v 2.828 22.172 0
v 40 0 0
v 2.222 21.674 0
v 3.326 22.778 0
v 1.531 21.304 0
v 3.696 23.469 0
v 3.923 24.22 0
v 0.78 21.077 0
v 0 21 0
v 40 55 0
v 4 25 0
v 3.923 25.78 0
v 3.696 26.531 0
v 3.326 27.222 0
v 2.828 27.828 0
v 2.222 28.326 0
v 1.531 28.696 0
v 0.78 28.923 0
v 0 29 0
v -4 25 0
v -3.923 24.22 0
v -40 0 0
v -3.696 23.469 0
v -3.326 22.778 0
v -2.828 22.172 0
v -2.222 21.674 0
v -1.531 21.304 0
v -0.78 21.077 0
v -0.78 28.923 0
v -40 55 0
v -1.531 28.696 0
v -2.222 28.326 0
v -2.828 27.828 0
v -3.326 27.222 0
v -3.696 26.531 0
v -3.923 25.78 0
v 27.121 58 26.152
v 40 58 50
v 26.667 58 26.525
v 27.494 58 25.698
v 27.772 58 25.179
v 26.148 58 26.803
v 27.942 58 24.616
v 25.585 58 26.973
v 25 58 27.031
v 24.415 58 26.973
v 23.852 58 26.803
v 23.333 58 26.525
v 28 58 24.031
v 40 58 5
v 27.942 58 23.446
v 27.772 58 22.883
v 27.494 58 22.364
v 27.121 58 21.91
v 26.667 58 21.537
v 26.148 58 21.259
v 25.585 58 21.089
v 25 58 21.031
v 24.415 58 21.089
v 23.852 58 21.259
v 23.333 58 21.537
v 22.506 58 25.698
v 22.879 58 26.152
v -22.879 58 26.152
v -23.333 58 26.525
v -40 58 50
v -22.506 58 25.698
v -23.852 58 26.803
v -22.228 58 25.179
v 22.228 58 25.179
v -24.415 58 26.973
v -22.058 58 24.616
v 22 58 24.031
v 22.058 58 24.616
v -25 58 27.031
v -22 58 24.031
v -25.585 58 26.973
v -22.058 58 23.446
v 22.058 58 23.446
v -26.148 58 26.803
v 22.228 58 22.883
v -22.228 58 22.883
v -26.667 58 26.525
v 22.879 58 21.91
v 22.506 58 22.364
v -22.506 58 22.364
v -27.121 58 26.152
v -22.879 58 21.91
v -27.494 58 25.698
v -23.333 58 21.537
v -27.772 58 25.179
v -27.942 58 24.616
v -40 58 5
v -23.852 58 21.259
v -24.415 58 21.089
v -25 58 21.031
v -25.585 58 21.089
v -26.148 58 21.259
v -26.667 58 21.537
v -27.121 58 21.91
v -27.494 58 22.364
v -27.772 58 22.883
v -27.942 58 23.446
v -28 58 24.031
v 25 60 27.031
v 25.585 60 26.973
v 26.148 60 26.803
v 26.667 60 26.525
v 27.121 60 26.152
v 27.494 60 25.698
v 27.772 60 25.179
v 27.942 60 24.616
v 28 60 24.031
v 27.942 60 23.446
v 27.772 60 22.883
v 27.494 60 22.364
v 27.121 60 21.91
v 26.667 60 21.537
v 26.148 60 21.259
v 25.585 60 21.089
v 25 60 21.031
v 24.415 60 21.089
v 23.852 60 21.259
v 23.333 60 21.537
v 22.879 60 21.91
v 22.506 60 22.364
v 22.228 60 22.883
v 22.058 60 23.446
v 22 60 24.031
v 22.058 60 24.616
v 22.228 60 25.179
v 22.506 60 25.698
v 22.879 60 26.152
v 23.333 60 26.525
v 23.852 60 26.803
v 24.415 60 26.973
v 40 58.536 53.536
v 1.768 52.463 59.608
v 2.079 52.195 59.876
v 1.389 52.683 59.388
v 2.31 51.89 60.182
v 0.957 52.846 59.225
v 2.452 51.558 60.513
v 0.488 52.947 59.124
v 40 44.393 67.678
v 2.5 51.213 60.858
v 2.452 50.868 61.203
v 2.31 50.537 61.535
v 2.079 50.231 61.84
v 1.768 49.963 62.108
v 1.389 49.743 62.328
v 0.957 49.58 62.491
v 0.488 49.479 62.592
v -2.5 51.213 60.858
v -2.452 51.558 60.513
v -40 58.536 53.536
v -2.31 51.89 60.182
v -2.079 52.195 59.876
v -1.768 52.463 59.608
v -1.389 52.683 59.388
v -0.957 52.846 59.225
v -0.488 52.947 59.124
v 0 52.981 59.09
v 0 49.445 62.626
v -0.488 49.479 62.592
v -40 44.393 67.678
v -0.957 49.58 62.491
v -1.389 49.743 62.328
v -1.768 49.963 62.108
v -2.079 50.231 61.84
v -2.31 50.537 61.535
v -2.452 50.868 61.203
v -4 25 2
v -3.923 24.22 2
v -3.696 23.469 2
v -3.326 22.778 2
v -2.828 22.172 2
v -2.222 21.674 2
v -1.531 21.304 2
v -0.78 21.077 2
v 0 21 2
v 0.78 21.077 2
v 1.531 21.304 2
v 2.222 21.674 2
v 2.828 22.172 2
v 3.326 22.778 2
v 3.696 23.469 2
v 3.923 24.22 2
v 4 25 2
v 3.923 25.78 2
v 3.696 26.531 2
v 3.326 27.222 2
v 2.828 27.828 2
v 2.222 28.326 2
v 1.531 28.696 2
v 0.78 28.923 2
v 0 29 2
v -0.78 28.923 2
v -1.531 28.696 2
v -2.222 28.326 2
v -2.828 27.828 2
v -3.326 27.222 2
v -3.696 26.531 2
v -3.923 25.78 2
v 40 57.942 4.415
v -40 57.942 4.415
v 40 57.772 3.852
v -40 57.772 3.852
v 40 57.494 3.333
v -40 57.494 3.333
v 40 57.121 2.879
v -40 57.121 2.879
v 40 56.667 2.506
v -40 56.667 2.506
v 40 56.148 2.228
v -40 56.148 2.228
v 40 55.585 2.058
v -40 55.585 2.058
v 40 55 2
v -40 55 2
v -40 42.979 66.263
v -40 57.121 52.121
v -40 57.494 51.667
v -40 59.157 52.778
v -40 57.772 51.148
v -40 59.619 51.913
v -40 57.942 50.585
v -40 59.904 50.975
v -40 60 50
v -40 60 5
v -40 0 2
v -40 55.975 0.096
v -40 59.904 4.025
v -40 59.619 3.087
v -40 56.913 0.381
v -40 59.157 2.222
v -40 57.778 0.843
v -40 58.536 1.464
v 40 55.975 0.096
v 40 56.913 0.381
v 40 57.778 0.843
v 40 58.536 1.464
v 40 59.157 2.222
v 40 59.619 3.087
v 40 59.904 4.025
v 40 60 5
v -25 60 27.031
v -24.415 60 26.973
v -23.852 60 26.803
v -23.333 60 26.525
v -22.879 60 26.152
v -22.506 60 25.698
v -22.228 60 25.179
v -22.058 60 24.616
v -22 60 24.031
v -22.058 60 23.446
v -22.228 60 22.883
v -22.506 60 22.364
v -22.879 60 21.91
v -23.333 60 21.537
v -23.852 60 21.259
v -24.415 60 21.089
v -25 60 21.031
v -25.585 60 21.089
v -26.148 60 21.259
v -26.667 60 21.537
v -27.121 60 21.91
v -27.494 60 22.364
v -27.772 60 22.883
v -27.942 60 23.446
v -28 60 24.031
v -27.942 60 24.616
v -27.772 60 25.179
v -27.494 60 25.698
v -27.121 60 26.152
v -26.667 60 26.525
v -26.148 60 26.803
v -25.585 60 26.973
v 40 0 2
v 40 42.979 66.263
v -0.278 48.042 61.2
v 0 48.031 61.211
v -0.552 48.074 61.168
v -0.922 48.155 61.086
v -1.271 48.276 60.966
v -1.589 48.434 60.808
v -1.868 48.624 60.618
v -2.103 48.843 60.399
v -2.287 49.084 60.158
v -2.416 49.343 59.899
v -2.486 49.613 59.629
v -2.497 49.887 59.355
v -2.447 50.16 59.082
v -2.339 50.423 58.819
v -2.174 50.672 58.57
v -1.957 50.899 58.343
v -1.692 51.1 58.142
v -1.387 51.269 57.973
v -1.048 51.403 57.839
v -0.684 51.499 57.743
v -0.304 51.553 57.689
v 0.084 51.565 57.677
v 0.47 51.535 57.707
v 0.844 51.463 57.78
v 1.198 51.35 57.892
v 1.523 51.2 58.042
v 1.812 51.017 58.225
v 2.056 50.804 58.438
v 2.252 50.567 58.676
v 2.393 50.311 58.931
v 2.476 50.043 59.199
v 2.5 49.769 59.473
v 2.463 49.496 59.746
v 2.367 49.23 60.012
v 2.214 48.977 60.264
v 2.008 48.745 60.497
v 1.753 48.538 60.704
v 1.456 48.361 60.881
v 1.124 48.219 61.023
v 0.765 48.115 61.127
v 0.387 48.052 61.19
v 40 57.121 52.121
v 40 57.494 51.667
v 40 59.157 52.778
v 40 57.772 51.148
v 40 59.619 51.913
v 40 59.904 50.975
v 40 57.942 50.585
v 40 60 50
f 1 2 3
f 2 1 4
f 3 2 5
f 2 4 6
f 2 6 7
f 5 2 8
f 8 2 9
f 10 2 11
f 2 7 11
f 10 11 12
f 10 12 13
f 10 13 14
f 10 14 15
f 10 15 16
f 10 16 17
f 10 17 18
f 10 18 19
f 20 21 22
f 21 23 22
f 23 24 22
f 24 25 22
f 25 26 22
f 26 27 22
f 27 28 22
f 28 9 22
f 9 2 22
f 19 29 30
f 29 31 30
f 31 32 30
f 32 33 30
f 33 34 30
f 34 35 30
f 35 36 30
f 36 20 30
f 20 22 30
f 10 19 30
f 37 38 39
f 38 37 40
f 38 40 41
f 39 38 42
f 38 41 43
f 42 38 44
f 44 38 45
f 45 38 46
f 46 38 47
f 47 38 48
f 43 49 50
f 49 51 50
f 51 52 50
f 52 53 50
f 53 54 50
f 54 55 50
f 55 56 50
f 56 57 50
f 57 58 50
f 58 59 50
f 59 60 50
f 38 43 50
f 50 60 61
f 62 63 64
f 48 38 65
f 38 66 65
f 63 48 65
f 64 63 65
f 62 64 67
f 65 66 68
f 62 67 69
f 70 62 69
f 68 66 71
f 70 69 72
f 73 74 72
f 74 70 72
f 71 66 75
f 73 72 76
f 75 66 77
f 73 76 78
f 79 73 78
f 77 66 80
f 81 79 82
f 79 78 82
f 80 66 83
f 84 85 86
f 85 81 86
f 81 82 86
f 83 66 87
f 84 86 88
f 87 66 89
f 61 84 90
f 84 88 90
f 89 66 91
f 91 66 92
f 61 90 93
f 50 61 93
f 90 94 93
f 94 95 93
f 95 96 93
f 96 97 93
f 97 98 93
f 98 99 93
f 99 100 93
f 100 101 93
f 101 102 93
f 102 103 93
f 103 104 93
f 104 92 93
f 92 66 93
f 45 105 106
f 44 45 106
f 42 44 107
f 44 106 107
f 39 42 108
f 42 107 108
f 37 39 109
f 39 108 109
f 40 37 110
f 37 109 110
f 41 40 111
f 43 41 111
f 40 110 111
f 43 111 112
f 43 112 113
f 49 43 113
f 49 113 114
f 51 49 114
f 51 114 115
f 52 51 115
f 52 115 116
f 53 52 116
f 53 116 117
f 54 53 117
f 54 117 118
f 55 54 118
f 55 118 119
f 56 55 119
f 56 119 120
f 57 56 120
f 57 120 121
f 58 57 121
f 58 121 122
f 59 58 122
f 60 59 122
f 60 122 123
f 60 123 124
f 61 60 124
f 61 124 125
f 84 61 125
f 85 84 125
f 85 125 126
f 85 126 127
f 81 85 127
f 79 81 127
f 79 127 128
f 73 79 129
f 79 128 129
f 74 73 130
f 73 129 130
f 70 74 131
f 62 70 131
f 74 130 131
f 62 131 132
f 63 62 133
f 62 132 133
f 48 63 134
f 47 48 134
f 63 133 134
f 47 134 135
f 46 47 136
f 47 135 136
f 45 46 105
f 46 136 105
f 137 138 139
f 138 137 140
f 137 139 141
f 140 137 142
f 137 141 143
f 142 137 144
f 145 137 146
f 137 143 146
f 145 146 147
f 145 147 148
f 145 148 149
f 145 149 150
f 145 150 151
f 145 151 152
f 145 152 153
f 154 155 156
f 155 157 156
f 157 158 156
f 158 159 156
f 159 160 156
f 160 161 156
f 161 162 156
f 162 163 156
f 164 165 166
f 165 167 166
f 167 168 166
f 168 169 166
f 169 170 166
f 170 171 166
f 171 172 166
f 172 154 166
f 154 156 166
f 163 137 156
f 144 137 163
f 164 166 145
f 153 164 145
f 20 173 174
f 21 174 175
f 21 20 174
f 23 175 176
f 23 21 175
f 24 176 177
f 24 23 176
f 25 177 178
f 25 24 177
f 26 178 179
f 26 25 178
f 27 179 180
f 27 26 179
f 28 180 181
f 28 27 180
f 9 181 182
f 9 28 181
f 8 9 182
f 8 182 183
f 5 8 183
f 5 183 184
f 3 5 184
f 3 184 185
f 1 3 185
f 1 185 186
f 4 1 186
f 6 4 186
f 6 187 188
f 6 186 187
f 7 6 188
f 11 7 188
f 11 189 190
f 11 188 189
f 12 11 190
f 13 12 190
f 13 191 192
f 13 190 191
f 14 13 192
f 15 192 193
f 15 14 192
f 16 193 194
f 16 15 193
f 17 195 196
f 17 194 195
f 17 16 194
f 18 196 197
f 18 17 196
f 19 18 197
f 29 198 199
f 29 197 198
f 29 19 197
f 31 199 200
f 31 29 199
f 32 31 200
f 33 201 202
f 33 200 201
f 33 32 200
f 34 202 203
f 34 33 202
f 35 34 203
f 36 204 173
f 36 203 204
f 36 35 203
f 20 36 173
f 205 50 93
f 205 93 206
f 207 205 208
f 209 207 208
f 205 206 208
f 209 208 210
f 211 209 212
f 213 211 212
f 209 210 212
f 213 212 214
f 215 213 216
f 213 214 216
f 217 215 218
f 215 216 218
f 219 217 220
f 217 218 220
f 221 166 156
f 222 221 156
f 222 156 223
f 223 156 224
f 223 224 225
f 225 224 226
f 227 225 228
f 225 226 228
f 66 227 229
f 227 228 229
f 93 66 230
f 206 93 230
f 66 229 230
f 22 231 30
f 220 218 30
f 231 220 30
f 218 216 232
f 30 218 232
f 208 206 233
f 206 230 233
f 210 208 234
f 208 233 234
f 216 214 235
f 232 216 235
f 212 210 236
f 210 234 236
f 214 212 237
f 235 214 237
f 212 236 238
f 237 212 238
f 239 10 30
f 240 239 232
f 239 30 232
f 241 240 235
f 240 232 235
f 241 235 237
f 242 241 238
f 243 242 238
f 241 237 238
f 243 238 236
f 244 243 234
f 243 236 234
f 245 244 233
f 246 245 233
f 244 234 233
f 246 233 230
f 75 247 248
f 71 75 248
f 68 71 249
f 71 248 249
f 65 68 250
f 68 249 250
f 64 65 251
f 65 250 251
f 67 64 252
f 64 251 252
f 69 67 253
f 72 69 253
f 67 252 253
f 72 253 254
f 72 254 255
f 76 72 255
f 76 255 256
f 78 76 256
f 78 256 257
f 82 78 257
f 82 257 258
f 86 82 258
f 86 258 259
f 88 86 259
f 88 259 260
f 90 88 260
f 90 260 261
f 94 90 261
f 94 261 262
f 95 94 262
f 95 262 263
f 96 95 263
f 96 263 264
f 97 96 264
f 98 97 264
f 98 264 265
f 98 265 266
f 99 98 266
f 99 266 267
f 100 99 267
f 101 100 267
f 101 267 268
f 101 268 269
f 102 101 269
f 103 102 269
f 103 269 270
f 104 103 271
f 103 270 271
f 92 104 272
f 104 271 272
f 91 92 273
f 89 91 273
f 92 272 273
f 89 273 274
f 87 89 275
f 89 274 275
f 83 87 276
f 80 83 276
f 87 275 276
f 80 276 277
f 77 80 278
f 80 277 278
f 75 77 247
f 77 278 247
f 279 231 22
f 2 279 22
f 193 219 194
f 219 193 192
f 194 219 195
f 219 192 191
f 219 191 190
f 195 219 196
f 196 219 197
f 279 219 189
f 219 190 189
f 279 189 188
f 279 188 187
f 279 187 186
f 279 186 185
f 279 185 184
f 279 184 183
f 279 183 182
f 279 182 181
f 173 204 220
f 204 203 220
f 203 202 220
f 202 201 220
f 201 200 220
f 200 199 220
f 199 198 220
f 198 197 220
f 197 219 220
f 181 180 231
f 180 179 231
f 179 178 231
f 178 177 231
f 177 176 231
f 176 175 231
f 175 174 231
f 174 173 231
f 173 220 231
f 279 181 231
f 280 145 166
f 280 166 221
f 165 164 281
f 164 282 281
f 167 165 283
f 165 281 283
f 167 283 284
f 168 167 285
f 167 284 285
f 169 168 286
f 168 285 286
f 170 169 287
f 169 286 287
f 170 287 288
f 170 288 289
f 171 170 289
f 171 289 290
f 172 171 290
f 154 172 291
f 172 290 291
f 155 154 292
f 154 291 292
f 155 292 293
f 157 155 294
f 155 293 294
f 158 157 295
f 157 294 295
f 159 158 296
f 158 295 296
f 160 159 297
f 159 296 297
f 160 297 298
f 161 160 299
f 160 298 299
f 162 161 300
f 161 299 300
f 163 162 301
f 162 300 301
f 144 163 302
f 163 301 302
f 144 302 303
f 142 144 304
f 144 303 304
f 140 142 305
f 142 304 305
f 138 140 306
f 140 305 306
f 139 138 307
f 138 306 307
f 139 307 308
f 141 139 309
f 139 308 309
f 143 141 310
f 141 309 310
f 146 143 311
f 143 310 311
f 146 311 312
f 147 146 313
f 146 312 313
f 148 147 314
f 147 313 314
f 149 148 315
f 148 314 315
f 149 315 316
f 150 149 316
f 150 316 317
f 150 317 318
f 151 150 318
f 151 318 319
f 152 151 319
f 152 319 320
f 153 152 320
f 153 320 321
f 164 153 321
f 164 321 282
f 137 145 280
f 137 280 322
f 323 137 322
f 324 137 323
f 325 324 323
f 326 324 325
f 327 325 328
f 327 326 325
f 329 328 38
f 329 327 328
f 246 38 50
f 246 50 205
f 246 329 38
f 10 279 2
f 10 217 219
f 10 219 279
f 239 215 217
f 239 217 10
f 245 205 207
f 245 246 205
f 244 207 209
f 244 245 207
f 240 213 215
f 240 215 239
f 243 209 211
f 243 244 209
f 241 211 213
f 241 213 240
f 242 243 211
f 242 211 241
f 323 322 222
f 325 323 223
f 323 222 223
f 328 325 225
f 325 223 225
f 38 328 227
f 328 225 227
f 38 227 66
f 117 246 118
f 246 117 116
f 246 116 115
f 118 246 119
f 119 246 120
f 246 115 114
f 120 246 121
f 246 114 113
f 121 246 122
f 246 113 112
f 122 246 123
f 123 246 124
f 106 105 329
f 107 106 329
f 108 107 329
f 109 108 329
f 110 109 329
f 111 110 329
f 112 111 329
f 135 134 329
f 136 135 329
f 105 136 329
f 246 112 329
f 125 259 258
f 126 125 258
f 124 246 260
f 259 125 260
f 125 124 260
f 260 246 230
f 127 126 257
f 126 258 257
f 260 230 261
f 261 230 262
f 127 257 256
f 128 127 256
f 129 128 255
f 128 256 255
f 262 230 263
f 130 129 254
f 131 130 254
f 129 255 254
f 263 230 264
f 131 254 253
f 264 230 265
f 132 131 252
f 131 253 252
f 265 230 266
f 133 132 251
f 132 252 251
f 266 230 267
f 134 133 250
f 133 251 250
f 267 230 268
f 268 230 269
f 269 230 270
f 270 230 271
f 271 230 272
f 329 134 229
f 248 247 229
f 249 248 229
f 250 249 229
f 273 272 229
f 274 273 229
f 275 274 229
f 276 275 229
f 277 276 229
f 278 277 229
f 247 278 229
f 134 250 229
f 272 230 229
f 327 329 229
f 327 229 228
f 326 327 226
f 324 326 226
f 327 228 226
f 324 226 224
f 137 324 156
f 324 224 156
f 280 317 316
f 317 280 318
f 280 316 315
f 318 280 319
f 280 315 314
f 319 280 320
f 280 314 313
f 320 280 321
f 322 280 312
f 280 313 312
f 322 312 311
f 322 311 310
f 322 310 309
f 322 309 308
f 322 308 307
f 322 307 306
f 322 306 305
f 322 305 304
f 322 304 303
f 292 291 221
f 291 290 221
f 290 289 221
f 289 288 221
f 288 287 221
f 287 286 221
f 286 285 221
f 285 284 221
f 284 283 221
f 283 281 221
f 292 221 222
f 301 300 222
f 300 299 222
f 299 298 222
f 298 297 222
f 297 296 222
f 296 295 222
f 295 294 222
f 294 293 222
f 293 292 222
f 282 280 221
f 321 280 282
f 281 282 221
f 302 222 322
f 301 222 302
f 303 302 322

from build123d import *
from OCP.BRepAlgoAPI import BRepAlgoAPI_Cut
from OCP.TopTools import TopTools_ListOfShape

# Parameters (mm, degrees)
EXTRUDE_START       = -40
EXTRUDE_1_DEPTH     = 80
SKETCH_2_R          = 4
CUT_EXTRUDE_1_DEPTH = 99.895232583
SKETCH_3_R          = 3
CUT_EXTRUDE_2_DEPTH = 99.895232848
SWEEP_6_PROFILE_R   = 2.5


with BuildPart() as part:
    # 凸台-拉伸1: read off the stored shape, not the designer's step
    # 凸台-拉伸1 outline → 凸台-拉伸1 (new body)
    with BuildSketch(Plane(origin=(0, 0, 0), x_dir=(0, 0, -1), z_dir=(1, 0, 0)).offset(EXTRUDE_START)):
        with BuildLine():
            Line((-1.999999781, -5.28e-07), (8.38e-07, -5.28e-07))
            Line((8.38e-07, -5.28e-07), (8.38e-07, 54.999999472))
            ThreePointArc((8.38e-07, 54.999999472), (-1.464465344, 58.535533909), (-4.999999781, 60.000000091))
            Line((-4.999999781, 60.000000091), (-49.999999781, 60.000000091))
            ThreePointArc((-49.999999781, 60.000000091), (-51.913417169, 59.619397955), (-53.535534, 58.535534))
            Line((-53.535534, 58.535534), (-67.67767, 44.393398))
            Line((-67.67767, 44.393398), (-66.262742, 42.978678))
            Line((-66.262742, 42.978678), (-52.12132, 57.12132))
            ThreePointArc((-52.12132, 57.12132), (-51.148050068, 57.771638319), (-49.999999781, 57.999999472))
            Line((-49.999999781, 57.999999472), (-4.999999781, 57.999999472))
            ThreePointArc((-4.999999781, 57.999999472), (-2.878679344, 57.121319909), (-1.999999781, 54.999999472))
            Line((-1.999999781, 54.999999472), (-1.999999781, -5.28e-07))
        make_face()
    extrude(amount=EXTRUDE_1_DEPTH)


with BuildPart() as cut_extrude_1_tool:
    # 草图2 → 切除-拉伸1 (new, through all)
    with BuildSketch(Plane.XY):
        with Locations(Location((0, 25, 0), (0, 0, 180))):
            Circle(SKETCH_2_R)
    extrude(amount=CUT_EXTRUDE_1_DEPTH)


with BuildPart() as part_1:
    add(part.part)

    # 切除-拉伸1: cut by cut_extrude_1_tool, with a tolerance
    cut_extrude_1_stock = TopTools_ListOfShape()
    cut_extrude_1_stock.Append(part_1.part.wrapped)
    cut_extrude_1_tools = TopTools_ListOfShape()
    cut_extrude_1_tools.Append(cut_extrude_1_tool.part.wrapped)
    cut_extrude_1_cut = BRepAlgoAPI_Cut()
    cut_extrude_1_cut.SetArguments(cut_extrude_1_stock)
    cut_extrude_1_cut.SetTools(cut_extrude_1_tools)
    cut_extrude_1_cut.SetFuzzyValue(0.00001)
    cut_extrude_1_cut.Build()
    add(Compound.cast(cut_extrude_1_cut.Shape()).solids(), mode=Mode.REPLACE)

    # 草图3 → 切除-拉伸2 (cut, through all)
    with BuildSketch(Plane(origin=(0, 60, 0), x_dir=(1, 0, 0), z_dir=(0, 1, 0))):
        with Locations(Location((-25, -24.031, 0), (0, 0, 270))):
            Circle(SKETCH_3_R)
        with Locations(Location((25, -24.031, 0), (0, 0, 270))):
            Circle(SKETCH_3_R)
    extrude(amount=-CUT_EXTRUDE_2_DEPTH, mode=Mode.SUBTRACT)

    # 切除-扫描6: sweep along a curve in space
    with BuildLine() as sweep_6_path:
        Line((0, 53.11, 62.755), (0, 46.038932, 55.683932))
    # 切除-扫描6 profile (on start of the path) → 切除-扫描6 (sweep, cut)
    with BuildSketch(Plane(origin=(0, 53.11, 62.755), x_dir=(0, -0.7071067811865479, 0.7071067811865471), z_dir=(0, -0.7071067811865471, -0.7071067811865479))):
        Circle(SWEEP_6_PROFILE_R)
    sweep(path=sweep_6_path.line, mode=Mode.SUBTRACT)


solid = part_1.part
